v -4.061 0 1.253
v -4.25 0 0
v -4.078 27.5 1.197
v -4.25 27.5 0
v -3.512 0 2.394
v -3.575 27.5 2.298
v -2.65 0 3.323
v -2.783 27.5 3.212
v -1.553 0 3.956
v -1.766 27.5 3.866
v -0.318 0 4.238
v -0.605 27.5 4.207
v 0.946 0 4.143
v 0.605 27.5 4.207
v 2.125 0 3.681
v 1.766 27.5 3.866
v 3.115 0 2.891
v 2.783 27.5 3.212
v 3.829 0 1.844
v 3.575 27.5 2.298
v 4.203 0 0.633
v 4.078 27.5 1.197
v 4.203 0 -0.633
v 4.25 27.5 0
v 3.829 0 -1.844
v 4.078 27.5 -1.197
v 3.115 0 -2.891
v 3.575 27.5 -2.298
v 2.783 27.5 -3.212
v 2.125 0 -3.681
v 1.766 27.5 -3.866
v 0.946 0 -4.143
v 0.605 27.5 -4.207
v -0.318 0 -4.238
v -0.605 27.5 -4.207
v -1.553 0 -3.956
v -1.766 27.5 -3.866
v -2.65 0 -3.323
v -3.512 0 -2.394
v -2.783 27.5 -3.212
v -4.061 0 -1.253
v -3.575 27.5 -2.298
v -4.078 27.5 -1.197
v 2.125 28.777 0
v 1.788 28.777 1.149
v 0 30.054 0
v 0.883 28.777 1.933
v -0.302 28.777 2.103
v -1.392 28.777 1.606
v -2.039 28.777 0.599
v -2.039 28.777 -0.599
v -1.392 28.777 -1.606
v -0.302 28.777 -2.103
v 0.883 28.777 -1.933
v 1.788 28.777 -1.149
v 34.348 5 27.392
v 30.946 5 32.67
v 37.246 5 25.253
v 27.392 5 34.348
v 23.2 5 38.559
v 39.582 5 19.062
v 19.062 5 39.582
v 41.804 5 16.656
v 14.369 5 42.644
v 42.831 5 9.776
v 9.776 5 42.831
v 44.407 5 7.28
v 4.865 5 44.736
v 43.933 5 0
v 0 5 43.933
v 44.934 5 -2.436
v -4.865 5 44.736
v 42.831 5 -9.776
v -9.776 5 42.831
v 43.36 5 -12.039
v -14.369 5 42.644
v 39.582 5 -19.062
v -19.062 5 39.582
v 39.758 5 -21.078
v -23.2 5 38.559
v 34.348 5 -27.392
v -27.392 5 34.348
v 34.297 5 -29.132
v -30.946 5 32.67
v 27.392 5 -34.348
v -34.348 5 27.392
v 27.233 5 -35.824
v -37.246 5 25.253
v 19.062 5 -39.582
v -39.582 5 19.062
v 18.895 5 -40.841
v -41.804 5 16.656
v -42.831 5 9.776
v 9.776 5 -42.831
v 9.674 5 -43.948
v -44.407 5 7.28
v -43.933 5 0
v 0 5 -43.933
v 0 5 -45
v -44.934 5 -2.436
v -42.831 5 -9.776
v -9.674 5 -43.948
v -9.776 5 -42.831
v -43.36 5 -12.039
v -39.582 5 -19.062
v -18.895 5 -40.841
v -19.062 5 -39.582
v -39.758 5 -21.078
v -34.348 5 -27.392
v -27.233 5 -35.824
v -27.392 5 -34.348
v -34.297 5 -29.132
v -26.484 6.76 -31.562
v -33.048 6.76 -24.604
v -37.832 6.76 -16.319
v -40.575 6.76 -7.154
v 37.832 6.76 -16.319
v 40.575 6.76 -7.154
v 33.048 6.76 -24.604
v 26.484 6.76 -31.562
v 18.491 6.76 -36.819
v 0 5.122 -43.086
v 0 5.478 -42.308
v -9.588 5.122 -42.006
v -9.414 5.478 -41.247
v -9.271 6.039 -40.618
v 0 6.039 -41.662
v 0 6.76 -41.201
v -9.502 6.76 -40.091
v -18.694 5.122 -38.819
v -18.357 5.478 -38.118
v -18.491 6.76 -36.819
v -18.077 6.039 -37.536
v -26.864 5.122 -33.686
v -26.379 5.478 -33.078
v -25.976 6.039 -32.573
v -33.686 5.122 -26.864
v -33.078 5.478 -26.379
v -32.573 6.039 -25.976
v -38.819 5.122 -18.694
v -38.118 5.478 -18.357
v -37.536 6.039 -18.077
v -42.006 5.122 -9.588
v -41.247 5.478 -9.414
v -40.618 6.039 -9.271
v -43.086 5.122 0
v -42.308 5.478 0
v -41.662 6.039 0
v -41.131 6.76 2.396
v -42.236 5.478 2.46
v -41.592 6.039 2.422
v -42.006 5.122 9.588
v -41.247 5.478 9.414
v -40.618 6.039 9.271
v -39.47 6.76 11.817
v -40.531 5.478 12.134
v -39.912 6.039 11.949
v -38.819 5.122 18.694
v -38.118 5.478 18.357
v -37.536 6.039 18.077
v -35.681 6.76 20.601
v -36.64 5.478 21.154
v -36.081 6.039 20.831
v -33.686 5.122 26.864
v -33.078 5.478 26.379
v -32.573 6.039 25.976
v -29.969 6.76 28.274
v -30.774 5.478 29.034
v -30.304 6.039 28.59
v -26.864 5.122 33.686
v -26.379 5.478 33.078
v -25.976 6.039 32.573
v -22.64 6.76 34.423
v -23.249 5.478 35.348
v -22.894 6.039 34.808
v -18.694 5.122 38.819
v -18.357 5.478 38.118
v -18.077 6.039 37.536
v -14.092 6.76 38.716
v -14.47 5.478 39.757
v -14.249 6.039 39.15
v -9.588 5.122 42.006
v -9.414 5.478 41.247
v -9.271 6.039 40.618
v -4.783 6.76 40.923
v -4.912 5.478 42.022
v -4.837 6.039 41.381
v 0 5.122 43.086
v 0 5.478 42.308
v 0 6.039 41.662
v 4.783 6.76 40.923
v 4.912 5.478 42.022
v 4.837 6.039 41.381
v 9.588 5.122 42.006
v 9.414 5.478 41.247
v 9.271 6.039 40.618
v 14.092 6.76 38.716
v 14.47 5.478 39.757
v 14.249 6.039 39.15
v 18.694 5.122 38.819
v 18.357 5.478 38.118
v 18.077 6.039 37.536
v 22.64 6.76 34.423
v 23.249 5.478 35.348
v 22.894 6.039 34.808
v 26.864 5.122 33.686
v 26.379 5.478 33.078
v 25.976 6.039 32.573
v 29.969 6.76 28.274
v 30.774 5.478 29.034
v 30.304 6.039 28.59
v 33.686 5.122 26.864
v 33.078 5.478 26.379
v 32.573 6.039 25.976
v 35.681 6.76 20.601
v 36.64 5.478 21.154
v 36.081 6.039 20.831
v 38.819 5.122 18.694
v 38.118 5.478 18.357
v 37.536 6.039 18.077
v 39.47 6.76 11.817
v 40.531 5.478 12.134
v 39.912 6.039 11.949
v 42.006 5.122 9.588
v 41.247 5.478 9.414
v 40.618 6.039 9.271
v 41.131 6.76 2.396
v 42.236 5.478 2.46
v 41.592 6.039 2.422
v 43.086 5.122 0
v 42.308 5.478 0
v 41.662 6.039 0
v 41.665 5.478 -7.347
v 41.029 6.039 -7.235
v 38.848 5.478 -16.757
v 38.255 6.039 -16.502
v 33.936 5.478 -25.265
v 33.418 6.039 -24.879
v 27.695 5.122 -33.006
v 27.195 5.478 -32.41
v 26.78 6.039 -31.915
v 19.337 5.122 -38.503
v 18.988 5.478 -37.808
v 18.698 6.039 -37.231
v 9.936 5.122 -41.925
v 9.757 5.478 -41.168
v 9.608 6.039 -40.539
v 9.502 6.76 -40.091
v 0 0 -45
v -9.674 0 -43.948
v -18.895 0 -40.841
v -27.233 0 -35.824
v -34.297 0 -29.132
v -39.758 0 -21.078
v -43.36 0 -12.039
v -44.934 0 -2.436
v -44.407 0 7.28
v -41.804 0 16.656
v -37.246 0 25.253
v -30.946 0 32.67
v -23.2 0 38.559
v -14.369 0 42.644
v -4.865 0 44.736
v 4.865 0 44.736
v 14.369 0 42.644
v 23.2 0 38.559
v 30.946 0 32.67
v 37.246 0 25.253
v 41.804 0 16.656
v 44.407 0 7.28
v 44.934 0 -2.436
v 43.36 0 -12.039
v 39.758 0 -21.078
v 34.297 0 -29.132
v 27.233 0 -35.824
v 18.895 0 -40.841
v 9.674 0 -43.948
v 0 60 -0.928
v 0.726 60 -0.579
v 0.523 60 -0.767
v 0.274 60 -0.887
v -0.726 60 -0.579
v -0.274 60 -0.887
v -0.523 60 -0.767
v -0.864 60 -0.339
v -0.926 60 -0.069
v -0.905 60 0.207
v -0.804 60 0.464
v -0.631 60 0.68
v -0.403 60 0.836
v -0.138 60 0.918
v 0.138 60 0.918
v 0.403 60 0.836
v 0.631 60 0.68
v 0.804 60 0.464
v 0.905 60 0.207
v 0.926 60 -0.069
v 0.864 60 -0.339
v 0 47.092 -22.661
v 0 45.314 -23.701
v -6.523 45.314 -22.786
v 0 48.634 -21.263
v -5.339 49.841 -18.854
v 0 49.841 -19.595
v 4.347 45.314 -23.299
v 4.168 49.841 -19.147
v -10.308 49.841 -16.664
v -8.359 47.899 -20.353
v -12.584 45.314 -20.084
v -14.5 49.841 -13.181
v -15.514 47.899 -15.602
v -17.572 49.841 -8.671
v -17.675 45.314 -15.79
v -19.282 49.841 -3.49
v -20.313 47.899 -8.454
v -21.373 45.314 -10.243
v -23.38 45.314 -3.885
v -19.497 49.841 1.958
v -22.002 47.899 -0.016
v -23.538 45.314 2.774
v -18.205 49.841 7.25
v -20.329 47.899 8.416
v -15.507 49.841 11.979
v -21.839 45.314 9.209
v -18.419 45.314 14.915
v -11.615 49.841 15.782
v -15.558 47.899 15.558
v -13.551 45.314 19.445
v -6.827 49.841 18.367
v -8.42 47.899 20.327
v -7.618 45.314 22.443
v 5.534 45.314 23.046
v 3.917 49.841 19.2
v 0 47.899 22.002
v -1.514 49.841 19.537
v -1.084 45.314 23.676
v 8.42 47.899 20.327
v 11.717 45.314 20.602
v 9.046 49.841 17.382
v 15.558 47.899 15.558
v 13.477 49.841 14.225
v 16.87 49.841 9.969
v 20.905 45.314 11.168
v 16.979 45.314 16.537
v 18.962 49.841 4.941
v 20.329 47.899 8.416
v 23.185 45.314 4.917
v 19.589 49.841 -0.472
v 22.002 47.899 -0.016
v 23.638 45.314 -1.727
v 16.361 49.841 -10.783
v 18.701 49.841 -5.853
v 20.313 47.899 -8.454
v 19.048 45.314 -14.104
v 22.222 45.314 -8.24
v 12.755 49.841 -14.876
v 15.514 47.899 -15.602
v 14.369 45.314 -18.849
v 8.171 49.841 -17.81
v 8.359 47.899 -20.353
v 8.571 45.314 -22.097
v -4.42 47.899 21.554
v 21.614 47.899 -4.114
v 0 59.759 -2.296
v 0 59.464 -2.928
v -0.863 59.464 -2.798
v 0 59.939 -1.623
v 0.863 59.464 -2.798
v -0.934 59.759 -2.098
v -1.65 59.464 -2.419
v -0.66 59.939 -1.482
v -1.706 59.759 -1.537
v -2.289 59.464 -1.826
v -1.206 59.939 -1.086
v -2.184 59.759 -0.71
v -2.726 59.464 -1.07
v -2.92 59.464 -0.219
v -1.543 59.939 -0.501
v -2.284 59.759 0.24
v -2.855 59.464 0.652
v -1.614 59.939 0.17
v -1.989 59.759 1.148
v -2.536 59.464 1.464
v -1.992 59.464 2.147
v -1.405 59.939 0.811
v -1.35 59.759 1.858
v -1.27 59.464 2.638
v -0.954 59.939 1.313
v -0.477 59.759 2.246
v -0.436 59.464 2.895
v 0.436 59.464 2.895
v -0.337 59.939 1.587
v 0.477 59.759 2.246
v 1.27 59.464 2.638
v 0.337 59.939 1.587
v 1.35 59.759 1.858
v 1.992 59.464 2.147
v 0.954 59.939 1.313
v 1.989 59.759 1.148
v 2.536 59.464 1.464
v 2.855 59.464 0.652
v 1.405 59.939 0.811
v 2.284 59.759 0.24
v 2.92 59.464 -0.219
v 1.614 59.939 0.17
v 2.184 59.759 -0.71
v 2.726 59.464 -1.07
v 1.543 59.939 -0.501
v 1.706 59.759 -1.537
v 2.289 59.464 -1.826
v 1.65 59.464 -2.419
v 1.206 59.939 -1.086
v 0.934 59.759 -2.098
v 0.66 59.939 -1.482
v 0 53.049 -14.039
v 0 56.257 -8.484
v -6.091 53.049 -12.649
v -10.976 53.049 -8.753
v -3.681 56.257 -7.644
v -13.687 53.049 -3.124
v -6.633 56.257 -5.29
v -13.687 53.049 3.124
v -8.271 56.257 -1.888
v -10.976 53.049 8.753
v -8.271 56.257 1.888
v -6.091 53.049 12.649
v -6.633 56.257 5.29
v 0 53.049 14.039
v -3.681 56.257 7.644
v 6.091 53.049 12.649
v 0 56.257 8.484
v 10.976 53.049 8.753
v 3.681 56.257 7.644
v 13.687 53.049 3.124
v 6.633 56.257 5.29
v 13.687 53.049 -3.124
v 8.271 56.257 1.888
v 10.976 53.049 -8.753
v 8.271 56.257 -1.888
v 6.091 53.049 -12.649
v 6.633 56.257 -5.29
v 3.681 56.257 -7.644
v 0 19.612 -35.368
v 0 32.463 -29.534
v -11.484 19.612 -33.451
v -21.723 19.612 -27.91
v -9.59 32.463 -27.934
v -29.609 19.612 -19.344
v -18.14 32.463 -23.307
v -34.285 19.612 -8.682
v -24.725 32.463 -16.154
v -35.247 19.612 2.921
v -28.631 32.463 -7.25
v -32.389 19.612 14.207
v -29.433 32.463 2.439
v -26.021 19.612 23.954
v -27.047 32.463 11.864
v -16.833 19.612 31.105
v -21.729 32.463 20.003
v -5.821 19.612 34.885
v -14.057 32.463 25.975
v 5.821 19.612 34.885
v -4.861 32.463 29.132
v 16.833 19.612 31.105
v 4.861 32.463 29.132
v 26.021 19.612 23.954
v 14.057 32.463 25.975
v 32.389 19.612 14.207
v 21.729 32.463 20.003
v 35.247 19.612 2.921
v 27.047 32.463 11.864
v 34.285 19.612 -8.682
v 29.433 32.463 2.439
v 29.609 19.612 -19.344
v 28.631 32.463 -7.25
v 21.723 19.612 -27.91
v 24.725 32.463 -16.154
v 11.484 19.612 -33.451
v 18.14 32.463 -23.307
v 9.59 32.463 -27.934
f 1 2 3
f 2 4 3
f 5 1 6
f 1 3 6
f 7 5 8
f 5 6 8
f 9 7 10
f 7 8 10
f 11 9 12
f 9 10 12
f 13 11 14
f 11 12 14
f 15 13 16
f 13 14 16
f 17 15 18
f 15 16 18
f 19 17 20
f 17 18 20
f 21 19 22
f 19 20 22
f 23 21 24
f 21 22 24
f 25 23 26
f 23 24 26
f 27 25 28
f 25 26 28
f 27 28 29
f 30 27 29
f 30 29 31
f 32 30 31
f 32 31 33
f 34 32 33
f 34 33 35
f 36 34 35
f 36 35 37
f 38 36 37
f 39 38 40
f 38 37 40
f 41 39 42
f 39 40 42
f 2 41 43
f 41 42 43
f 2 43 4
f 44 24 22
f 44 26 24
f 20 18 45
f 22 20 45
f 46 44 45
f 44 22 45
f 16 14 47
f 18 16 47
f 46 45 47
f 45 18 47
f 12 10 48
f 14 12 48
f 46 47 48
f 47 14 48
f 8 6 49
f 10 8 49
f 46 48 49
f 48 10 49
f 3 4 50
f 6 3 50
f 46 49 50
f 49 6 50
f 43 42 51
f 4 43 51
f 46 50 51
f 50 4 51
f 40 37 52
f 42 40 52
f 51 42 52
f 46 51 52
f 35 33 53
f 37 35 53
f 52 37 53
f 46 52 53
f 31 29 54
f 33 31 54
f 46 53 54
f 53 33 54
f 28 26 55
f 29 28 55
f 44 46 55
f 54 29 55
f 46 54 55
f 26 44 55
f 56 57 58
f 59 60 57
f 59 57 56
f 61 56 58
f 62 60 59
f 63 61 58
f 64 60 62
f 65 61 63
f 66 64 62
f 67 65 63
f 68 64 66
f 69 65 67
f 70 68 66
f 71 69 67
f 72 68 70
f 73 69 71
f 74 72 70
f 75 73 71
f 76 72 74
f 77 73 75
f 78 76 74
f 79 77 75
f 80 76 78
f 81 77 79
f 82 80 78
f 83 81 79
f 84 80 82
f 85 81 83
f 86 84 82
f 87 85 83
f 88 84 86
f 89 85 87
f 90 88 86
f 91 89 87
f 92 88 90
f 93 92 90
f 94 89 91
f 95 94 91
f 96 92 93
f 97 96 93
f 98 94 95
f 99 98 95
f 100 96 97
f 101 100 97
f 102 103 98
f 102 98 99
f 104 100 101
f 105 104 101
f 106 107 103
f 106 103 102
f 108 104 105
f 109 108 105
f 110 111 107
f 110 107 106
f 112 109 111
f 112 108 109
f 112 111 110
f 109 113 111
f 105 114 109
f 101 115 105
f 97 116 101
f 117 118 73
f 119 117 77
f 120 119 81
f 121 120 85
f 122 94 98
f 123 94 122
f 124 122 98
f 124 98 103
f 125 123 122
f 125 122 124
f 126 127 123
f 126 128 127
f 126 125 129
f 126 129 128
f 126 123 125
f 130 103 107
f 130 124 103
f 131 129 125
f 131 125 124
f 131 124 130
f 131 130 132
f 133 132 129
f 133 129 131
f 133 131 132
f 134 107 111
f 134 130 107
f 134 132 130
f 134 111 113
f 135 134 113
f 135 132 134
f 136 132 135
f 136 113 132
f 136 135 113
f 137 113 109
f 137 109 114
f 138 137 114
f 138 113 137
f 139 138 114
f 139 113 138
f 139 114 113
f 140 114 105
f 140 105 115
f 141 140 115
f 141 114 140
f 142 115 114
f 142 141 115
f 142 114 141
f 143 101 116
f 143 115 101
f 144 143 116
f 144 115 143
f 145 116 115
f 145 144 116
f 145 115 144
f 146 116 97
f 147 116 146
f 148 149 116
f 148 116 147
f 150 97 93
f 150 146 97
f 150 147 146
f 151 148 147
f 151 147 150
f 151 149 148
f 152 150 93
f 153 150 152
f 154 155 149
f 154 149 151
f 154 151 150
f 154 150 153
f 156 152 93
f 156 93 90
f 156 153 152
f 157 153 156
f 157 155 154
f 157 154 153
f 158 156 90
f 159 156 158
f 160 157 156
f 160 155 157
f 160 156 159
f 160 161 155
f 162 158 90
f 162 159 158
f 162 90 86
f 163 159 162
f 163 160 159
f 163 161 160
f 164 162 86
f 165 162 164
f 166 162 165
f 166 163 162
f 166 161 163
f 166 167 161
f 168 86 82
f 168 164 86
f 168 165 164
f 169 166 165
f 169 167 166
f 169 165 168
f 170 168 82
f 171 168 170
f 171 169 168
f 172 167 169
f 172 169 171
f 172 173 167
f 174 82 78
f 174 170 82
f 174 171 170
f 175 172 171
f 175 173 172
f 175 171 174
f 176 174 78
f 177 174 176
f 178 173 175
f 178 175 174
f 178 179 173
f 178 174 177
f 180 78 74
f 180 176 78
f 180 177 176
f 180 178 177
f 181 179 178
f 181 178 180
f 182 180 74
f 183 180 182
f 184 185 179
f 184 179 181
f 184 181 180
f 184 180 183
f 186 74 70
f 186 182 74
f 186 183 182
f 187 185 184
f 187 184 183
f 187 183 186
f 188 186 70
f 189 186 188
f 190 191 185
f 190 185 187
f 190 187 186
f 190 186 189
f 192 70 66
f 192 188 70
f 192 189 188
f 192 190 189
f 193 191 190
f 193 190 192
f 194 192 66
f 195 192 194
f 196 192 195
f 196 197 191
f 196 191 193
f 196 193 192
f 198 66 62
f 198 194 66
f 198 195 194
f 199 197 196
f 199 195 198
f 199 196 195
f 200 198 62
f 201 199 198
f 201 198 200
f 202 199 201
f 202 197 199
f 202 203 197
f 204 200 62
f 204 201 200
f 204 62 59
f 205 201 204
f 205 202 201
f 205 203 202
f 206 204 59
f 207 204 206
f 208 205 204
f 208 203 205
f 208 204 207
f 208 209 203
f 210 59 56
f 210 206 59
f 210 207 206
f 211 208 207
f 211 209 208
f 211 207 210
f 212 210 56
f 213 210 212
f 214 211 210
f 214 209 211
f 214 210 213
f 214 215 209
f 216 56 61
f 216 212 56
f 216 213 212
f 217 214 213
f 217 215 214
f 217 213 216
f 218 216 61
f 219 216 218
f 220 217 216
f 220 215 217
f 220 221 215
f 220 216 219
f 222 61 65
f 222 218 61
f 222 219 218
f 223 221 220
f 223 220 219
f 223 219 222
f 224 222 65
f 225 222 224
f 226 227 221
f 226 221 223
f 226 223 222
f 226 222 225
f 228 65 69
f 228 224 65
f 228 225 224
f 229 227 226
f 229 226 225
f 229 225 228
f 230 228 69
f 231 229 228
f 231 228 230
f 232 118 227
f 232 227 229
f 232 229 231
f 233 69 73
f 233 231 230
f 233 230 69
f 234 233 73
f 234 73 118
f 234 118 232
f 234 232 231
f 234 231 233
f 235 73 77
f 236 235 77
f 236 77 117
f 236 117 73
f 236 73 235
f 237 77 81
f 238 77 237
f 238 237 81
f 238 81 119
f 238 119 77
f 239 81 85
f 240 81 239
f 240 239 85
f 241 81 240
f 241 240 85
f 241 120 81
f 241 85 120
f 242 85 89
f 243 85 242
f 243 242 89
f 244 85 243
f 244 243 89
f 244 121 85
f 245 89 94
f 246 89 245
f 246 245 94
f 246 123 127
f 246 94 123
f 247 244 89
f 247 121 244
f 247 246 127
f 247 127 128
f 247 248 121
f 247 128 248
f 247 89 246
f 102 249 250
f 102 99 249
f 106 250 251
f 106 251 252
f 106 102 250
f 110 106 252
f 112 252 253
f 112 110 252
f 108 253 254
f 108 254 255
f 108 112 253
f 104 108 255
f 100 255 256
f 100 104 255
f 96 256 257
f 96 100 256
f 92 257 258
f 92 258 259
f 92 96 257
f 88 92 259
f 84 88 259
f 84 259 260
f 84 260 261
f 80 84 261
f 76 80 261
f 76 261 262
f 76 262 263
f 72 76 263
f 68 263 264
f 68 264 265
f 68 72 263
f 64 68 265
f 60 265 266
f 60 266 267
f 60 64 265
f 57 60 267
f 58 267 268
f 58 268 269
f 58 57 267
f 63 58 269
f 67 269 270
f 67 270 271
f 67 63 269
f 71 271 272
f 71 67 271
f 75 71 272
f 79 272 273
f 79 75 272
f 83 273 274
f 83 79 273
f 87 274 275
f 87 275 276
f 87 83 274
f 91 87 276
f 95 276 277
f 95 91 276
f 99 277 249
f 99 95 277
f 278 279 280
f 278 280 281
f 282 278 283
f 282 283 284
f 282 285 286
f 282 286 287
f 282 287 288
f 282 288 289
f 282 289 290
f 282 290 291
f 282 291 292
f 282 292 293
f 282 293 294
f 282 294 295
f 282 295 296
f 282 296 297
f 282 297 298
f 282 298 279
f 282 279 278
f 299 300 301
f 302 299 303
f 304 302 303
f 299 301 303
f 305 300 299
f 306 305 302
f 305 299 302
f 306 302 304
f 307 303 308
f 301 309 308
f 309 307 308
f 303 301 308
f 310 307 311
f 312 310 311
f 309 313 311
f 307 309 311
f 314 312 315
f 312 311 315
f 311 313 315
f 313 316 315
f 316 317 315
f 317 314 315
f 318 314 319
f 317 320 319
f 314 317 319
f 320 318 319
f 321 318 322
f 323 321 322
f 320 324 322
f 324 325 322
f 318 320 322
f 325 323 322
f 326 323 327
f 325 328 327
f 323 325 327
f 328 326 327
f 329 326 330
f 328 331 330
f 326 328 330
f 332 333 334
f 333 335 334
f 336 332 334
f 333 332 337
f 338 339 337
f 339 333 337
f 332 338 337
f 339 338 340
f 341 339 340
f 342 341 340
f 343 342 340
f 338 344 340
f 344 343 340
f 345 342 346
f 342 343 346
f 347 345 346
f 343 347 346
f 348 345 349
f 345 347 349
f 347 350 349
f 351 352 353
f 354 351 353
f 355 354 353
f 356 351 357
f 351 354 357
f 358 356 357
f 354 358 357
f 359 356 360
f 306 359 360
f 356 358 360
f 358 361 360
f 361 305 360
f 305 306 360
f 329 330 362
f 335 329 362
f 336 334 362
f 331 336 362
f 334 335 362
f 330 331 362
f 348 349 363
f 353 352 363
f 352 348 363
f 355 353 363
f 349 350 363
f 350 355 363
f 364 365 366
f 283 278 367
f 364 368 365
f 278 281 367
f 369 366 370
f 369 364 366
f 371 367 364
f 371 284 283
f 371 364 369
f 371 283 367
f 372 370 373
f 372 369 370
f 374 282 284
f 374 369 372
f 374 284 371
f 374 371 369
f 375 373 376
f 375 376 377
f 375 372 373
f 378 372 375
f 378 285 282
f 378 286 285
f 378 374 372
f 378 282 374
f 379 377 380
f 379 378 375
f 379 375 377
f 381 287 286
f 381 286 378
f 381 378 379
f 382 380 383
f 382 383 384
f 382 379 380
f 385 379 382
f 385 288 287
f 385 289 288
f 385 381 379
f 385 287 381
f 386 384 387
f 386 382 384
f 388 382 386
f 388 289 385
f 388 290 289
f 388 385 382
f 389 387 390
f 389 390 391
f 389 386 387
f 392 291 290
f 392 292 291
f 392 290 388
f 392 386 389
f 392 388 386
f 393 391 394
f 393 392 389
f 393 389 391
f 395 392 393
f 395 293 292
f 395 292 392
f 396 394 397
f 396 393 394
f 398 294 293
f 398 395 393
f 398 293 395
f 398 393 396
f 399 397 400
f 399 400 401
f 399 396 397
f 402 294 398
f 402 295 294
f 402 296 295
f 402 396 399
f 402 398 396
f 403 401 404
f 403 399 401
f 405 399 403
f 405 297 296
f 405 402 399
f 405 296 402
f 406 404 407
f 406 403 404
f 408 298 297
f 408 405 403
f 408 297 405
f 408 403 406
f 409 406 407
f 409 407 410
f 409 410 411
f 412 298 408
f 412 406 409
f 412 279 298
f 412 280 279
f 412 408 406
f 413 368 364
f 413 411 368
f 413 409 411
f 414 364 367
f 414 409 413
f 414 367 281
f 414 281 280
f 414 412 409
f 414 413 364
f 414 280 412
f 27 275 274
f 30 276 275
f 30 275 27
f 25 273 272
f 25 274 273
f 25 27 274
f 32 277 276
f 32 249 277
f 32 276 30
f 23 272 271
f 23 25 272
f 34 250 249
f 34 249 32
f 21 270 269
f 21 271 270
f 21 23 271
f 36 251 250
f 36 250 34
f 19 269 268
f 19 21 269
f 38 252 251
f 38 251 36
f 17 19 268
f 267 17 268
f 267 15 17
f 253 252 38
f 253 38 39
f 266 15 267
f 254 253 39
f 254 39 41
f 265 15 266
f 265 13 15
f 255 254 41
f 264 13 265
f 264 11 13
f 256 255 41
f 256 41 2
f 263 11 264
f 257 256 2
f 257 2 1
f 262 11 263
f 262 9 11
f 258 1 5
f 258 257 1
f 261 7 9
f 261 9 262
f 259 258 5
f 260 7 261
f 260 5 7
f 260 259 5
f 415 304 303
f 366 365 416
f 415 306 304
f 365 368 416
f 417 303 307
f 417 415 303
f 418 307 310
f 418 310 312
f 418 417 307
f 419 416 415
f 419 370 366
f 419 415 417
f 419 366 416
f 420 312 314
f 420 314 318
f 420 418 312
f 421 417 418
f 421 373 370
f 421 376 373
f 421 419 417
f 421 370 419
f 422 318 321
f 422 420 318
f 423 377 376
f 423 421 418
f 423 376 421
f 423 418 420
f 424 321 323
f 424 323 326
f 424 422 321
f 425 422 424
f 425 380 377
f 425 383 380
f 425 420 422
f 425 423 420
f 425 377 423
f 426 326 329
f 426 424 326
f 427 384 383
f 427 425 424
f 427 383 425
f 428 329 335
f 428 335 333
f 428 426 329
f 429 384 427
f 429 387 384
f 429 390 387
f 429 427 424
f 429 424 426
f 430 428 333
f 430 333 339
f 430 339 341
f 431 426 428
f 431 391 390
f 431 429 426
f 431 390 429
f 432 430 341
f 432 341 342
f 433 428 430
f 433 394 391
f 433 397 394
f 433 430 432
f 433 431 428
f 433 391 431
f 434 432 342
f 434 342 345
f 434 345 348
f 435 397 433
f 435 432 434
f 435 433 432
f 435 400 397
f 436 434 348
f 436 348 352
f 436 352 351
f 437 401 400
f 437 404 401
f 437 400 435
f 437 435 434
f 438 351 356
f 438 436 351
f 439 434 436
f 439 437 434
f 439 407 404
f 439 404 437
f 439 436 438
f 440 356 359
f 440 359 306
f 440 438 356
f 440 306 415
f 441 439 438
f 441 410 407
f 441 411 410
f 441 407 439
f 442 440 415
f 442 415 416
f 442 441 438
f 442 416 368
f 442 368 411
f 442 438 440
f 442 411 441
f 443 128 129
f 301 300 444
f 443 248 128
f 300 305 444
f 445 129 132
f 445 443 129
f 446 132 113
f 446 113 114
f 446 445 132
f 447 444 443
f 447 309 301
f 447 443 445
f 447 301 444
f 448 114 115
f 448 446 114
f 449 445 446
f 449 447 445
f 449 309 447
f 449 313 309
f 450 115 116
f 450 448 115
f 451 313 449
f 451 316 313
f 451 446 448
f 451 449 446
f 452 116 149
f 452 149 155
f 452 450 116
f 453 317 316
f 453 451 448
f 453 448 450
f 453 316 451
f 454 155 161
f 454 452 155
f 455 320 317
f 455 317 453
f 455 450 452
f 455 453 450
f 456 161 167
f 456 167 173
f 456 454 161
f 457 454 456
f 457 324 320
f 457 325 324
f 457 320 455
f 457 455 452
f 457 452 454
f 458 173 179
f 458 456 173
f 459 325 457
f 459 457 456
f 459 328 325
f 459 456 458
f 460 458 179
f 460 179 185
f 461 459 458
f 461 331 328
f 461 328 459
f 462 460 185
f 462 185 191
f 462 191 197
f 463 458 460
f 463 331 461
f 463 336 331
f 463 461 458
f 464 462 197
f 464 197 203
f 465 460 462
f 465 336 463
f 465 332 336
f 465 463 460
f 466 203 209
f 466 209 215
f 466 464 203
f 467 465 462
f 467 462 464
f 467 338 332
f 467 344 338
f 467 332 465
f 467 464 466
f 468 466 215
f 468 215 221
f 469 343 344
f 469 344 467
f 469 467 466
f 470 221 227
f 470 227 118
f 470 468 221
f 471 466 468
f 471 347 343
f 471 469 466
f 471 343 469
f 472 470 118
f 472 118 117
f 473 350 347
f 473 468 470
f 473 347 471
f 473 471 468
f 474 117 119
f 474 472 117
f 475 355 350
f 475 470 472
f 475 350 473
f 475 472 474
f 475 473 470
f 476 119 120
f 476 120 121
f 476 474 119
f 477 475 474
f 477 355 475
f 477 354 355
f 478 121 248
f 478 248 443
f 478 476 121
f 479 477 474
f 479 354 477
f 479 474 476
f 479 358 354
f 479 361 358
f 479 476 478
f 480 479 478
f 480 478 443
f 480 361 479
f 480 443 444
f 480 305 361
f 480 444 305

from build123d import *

# Parameters (mm, degrees)
RACCORDO1_R                = 3
FORO_FILETTATO_M10_1_D     = 8.5
FORO_FILETTATO_M10_1_DEPTH = 27.5
FORO_FILETTATO_M10_1_TIP   = 2.553657631
RACCORDO2_R                = 10
RACCORDO3_R                = 4


with BuildPart() as part:
    # Schizzo1 → Rivoluzione1 (revolve)
    with BuildSketch(Plane(origin=(0, 0, 0), x_dir=(0, 0, -1), z_dir=(1, 0, 0)), mode=Mode.PRIVATE) as rivoluzione1_sk:
        Polygon((0, 0), (-45, 0), (-45, 5), (-42, 5), (-22.374431335, 48.236816584), (-2, 60), (0, 60), align=None)
    revolve(rivoluzione1_sk.sketch.rotate(Axis((0, 0, 0), (0, 1, 0)), 180), axis=Axis((0, 0, 0), (0, 1, 0)))

    # Raccordo1
    raccordo1_edges = [part.edges().sort_by_distance(p)[0] for p in [
        (0, 5, 42),
    ]]
    fillet(raccordo1_edges, radius=RACCORDO1_R)

    # Foro filettato M10-1
    with Locations(Plane.XZ):
        with Locations((0, 0)):
            Hole(FORO_FILETTATO_M10_1_D / 2, depth=FORO_FILETTATO_M10_1_DEPTH)
            with Locations((0, 0, -(FORO_FILETTATO_M10_1_DEPTH + FORO_FILETTATO_M10_1_TIP / 2))):  # 118° drill point
                Cone(0, FORO_FILETTATO_M10_1_D / 2, FORO_FILETTATO_M10_1_TIP, mode=Mode.SUBTRACT)

    # Raccordo2
    raccordo2_edges = [part.edges().sort_by_distance(p)[0] for p in [
        (0, 48.236816584, 22.374431335),
    ]]
    fillet(raccordo2_edges, radius=RACCORDO2_R)

    # Raccordo3
    raccordo3_edges = [part.edges().sort_by_distance(p)[0] for p in [
        (0, 60, 2),
    ]]
    fillet(raccordo3_edges, radius=RACCORDO3_R)


solid = part.part
